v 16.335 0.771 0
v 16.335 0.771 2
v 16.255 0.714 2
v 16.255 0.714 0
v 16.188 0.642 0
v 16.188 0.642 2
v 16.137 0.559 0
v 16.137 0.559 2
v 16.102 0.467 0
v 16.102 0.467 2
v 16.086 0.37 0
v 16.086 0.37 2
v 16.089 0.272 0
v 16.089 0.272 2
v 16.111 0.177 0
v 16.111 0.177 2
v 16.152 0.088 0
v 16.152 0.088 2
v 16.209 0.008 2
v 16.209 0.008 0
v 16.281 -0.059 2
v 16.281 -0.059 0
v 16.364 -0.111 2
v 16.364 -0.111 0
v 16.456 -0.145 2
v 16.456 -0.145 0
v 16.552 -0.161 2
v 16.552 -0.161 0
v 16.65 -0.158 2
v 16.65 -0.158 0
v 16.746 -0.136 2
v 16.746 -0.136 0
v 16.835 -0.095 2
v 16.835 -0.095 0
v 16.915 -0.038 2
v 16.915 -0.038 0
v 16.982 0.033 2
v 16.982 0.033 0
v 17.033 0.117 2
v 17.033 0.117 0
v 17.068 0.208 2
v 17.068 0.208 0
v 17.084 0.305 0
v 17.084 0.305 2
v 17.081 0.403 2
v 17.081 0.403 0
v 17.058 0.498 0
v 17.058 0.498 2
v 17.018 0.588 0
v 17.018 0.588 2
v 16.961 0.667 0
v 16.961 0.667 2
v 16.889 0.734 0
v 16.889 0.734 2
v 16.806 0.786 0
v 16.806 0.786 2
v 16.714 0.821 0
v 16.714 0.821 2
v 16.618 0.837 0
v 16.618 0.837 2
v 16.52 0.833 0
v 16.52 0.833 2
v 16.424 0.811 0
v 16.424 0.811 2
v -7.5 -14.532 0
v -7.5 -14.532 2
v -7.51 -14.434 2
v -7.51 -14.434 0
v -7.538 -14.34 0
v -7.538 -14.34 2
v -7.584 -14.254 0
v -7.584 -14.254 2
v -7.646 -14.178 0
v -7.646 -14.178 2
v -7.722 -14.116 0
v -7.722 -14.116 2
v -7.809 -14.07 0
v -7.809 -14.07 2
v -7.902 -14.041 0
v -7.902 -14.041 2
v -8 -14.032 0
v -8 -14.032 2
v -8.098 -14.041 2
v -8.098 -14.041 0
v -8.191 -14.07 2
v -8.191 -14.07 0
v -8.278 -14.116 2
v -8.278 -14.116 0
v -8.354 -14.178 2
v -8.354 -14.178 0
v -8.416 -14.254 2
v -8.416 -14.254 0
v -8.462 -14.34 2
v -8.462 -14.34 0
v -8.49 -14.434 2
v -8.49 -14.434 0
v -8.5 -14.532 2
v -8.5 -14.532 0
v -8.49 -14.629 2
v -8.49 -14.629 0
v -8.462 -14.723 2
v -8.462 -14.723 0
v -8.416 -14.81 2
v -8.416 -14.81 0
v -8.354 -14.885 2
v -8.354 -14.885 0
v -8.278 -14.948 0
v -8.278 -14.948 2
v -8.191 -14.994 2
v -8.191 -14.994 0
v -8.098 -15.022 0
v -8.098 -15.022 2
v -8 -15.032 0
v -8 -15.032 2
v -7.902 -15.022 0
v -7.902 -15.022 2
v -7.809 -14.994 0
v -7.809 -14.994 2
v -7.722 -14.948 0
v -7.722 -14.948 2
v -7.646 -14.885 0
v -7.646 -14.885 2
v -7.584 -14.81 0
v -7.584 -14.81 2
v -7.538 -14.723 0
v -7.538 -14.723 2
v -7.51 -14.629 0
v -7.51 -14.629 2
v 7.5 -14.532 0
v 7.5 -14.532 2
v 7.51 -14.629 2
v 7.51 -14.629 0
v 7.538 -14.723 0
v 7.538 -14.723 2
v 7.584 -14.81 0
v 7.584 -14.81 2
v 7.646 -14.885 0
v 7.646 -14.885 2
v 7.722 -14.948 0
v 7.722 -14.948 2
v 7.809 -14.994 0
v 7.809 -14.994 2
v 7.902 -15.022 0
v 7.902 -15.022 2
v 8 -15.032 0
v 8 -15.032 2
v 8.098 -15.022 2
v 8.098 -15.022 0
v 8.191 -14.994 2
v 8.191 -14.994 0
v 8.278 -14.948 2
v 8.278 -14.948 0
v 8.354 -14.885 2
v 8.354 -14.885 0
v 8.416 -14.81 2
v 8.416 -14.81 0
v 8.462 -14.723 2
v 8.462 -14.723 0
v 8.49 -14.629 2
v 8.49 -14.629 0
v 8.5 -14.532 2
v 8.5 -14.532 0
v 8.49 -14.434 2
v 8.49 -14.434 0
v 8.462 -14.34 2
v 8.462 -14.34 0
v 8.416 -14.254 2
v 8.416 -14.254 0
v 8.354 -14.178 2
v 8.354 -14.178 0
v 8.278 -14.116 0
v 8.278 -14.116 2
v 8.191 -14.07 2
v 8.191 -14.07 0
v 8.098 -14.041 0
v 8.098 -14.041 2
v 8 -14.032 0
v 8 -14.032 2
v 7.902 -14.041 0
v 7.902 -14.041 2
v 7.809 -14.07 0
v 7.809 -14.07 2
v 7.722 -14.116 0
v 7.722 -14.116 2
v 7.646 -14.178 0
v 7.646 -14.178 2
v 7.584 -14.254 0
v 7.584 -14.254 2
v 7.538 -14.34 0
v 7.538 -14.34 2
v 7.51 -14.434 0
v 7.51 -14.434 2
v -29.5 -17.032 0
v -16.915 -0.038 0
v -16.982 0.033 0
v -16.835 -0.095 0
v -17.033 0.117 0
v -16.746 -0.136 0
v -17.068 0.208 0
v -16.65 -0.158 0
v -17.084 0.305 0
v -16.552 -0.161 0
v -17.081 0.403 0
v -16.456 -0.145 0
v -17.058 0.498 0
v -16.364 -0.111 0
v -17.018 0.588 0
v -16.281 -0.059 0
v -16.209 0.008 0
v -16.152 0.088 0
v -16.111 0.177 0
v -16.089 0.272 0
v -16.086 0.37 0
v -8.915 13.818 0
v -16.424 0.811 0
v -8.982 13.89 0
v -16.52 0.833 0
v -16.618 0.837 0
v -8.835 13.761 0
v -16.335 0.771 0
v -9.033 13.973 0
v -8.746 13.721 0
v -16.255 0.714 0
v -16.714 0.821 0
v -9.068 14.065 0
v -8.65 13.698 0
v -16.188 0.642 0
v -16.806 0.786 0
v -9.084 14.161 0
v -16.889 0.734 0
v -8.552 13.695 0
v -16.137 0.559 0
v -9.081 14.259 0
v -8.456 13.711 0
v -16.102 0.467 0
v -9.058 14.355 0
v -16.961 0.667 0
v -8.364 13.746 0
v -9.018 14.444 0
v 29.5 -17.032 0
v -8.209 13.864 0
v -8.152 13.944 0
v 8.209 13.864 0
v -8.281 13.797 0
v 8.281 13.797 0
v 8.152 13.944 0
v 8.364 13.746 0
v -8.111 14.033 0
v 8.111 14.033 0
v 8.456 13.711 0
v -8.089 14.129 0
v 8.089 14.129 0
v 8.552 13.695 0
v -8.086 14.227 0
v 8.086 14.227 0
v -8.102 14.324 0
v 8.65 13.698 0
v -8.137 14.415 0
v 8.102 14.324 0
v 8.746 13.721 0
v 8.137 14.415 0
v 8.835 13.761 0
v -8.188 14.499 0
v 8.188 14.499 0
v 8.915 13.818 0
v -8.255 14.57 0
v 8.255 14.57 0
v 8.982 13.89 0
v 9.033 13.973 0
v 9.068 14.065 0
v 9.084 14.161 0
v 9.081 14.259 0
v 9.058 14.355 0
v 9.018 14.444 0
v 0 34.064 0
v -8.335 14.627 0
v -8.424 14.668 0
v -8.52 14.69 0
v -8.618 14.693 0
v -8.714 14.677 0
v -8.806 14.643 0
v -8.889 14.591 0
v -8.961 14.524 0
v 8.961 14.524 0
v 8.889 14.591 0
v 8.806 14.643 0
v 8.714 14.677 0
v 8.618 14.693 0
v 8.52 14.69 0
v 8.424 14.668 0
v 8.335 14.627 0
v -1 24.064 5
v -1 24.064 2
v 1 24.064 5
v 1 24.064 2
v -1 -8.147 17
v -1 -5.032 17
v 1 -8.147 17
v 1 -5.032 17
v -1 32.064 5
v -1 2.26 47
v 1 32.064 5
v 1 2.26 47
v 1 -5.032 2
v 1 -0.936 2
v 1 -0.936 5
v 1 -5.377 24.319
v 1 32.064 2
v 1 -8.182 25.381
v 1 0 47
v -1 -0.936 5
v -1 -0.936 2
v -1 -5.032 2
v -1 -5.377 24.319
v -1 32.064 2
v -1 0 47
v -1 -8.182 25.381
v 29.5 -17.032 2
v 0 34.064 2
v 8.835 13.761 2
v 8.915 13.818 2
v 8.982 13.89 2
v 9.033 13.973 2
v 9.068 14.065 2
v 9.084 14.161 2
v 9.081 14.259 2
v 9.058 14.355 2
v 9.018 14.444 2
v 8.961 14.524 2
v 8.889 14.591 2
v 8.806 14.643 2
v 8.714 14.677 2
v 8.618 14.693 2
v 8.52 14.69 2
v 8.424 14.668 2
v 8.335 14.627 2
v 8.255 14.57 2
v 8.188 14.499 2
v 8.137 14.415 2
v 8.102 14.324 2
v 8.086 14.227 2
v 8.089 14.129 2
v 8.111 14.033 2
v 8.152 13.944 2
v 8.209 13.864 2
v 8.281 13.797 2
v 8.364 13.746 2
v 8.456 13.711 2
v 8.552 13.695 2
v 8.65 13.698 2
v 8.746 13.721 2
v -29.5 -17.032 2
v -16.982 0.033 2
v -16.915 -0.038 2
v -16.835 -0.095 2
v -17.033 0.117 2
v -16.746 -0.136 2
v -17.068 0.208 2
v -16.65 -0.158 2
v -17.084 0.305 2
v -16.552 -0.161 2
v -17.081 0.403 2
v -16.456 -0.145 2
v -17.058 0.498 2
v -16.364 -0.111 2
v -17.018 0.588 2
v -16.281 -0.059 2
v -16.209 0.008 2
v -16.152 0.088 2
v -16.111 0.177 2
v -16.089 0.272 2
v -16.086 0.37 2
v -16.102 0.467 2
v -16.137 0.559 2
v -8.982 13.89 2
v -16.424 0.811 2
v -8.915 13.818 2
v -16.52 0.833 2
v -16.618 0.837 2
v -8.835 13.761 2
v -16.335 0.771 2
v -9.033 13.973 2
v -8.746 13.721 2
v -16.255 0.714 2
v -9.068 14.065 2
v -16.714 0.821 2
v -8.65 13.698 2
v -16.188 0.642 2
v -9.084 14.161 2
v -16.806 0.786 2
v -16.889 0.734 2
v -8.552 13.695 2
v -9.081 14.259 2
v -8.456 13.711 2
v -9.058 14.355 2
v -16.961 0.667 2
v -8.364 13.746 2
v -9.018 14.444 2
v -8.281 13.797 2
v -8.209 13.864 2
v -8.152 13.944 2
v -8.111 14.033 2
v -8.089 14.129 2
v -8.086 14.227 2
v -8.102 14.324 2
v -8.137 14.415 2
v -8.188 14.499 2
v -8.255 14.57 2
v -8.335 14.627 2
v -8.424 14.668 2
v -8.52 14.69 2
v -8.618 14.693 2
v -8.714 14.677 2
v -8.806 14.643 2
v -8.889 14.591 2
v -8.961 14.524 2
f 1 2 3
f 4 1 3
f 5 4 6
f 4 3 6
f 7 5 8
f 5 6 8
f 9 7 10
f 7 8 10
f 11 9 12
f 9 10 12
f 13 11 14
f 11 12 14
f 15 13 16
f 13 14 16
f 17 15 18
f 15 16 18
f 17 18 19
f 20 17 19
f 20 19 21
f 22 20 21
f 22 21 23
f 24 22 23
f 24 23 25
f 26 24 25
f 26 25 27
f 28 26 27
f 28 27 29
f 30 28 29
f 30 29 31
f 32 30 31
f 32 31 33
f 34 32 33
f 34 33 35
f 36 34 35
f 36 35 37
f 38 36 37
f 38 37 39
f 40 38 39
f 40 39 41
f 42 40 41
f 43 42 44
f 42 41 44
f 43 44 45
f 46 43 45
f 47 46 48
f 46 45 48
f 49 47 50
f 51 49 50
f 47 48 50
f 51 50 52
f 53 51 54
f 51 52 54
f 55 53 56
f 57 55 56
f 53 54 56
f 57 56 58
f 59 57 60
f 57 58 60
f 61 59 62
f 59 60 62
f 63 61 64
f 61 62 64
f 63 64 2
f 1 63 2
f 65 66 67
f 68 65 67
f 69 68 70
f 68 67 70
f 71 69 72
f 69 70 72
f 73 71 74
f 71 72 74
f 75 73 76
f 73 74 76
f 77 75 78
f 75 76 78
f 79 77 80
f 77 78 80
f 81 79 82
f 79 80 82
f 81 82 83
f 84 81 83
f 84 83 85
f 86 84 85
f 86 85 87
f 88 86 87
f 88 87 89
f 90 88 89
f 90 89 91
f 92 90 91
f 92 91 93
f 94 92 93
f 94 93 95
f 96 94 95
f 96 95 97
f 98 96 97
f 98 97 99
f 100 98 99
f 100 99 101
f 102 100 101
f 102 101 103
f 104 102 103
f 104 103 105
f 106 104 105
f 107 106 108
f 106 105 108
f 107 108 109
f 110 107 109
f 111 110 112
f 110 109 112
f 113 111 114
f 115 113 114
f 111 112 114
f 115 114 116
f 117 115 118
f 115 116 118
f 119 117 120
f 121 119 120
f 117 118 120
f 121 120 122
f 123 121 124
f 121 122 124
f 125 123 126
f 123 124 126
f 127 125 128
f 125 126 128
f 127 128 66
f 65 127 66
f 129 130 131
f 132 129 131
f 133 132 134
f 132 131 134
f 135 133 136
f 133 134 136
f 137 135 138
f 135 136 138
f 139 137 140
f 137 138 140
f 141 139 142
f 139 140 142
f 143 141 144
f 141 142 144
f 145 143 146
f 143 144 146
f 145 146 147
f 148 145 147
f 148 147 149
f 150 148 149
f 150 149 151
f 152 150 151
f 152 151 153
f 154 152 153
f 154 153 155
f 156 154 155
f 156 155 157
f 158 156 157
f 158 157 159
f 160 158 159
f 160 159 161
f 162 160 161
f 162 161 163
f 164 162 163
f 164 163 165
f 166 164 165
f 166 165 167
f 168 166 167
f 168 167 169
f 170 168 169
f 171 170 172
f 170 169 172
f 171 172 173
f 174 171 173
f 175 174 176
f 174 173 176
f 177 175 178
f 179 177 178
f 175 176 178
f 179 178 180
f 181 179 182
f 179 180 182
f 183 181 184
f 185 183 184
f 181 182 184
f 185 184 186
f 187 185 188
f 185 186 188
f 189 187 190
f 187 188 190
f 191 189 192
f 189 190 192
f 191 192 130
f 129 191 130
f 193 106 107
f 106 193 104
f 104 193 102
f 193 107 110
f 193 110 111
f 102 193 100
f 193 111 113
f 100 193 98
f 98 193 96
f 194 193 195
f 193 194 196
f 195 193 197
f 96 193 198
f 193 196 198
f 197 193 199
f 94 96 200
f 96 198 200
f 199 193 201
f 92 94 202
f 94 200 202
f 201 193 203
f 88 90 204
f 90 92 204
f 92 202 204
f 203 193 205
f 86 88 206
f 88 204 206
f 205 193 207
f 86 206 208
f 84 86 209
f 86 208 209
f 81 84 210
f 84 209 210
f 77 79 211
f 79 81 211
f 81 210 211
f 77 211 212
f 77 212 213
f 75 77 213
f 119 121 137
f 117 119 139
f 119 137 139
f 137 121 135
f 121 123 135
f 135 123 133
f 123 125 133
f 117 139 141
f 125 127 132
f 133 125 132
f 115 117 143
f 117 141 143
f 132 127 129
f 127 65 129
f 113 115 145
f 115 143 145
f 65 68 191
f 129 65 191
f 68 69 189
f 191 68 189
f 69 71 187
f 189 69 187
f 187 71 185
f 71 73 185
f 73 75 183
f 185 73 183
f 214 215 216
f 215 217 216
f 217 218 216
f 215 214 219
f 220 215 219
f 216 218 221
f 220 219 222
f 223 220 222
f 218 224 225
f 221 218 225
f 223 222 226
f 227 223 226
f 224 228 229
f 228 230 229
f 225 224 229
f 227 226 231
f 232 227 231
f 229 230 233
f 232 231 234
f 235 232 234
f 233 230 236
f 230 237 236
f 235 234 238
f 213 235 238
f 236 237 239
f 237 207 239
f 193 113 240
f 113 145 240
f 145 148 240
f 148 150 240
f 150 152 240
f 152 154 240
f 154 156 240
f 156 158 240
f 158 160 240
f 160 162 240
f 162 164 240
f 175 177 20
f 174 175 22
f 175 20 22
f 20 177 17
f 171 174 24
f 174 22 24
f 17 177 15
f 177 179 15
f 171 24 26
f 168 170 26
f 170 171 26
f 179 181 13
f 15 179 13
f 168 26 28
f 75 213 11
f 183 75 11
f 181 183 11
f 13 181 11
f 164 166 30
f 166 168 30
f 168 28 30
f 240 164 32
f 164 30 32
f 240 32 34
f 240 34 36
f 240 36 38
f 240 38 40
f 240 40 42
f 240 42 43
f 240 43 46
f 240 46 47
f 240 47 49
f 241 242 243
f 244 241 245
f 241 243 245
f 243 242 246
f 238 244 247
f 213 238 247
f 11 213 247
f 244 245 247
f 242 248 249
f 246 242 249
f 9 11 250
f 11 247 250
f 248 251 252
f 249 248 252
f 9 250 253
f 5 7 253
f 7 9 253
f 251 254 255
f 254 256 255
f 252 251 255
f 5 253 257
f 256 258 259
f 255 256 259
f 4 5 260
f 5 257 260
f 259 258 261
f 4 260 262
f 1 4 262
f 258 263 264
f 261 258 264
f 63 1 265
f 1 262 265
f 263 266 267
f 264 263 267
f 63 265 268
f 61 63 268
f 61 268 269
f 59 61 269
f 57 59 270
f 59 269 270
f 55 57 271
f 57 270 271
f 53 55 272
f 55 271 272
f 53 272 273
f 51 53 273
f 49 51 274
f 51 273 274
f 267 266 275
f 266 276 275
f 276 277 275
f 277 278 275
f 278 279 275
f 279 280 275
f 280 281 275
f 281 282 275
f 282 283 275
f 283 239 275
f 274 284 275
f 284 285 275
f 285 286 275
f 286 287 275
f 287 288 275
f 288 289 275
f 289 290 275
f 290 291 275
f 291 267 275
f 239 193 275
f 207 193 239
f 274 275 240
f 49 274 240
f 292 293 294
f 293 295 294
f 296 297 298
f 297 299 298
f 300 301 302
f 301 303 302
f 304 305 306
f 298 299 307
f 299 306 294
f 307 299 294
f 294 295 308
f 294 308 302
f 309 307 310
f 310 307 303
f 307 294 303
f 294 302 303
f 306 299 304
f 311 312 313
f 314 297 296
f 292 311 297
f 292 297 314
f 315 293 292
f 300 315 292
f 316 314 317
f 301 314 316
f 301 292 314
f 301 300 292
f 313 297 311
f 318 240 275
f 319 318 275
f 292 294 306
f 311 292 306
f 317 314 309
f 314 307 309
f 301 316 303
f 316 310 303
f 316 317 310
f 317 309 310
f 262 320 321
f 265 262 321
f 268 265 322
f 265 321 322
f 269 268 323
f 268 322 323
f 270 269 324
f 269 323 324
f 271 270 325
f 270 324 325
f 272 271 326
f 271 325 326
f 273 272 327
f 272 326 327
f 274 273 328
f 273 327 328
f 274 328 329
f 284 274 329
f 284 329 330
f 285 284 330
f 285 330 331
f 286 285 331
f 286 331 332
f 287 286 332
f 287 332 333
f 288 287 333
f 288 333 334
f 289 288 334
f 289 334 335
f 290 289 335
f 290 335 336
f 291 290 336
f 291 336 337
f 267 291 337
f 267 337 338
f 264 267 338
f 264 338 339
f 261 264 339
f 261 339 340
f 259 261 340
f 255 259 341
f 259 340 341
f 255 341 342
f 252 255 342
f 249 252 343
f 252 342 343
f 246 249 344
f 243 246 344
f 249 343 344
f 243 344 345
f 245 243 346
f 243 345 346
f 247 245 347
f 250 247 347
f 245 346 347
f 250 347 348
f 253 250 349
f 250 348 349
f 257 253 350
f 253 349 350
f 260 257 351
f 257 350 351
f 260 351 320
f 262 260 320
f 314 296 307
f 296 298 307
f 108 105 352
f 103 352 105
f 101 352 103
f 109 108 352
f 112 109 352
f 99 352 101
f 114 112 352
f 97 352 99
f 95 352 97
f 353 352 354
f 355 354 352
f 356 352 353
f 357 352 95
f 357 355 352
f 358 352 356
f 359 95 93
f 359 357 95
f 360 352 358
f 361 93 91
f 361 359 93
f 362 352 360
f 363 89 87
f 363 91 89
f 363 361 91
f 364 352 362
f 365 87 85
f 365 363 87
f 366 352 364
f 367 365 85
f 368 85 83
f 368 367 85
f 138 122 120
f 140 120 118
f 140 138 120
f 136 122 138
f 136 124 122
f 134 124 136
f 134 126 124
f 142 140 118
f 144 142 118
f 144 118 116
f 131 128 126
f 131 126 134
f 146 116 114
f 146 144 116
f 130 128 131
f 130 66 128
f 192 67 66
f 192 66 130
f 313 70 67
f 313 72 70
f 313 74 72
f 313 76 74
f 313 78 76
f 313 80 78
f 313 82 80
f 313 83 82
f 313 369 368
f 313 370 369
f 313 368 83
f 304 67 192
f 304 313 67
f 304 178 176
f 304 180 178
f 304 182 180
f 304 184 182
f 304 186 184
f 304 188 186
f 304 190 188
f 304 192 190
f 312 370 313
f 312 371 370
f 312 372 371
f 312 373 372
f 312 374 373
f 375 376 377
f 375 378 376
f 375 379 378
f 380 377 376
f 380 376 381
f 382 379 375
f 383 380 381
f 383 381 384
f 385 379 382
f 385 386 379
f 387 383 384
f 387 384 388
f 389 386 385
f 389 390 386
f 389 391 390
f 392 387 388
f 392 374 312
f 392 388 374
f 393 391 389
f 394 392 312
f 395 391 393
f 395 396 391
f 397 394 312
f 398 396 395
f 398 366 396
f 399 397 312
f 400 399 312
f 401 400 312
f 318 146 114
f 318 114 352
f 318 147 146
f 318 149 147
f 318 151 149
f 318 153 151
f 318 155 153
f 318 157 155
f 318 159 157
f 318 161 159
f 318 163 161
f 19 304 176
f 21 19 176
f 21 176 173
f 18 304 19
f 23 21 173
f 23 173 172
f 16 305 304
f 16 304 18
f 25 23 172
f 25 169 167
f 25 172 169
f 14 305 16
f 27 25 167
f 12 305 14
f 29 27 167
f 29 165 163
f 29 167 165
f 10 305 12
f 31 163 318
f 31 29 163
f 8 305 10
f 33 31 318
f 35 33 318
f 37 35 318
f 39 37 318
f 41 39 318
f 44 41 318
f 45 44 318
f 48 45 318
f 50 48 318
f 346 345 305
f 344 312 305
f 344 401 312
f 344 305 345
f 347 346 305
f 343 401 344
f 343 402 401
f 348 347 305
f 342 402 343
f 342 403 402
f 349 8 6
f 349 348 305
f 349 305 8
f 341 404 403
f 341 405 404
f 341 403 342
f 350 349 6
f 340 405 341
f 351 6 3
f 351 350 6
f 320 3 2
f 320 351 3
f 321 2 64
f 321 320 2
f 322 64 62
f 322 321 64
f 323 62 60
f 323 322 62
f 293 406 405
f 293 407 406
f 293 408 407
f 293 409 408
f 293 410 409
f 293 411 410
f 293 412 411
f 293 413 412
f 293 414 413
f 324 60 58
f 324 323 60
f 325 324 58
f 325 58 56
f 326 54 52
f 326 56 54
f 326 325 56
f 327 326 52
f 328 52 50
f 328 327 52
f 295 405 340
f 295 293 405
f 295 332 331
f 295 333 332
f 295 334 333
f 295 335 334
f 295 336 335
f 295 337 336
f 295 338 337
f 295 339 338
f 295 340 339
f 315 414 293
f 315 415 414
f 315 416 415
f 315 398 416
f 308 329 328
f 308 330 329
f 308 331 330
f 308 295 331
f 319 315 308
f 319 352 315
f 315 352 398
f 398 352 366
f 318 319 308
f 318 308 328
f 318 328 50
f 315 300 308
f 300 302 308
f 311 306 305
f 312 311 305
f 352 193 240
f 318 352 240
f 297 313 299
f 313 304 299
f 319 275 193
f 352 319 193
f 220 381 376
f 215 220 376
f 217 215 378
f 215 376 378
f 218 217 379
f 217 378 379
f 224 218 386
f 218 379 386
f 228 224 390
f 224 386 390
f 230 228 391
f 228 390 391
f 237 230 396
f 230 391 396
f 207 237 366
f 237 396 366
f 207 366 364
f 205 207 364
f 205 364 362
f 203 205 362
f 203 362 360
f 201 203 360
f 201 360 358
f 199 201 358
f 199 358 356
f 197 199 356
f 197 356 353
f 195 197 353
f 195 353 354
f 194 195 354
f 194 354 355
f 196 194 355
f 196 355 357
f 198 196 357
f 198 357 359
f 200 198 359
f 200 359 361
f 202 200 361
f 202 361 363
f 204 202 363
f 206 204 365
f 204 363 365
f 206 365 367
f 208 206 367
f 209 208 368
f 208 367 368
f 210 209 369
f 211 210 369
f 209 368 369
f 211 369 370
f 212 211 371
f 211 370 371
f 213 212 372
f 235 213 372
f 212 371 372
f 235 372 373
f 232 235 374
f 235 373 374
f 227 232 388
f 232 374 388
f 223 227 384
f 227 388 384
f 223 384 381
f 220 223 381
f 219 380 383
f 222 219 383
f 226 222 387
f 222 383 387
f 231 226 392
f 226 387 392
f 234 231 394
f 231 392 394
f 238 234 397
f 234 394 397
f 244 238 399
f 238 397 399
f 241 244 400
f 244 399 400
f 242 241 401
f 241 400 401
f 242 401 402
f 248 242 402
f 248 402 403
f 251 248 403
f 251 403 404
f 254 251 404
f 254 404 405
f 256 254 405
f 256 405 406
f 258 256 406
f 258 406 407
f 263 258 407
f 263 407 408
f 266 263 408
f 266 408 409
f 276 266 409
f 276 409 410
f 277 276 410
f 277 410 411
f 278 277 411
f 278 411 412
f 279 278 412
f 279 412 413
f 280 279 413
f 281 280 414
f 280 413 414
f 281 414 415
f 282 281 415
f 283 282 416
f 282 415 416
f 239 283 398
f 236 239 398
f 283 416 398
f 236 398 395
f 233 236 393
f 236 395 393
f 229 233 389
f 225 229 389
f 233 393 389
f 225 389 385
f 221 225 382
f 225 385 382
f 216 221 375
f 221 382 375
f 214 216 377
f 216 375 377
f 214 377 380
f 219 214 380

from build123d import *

# Parameters (mm, degrees)
BOSS_EXTRUDE1_DEPTH = 2
BOSS_EXTRUDE2_DEPTH = 1
SKETCH3_R           = 0.5
CUT_EXTRUDE1_DEPTH  = 64.683462008
CIRPATTERN1_COUNT   = 3


with BuildPart() as part:
    # Sketch1 → Boss-Extrude1 (new body)
    with BuildSketch(Plane.XY):
        Polygon((0, 34.063665882), (-29.5, -17.031832941), (29.5, -17.031832941), align=None)
    extrude(amount=BOSS_EXTRUDE1_DEPTH)

    # Sketch2 → Boss-Extrude2 (add, symmetric)
    with BuildSketch(Plane(origin=(0, 0, 0), x_dir=(0, 0, -1), z_dir=(1, 0, 0))):
        Polygon((-2, -0.936334118), (-2, -5.031832941), (-17, -5.031832941), (-17, -8.146867769), (-24.319391415, -5.376586618), (-25.381329824, -8.182346196), (-47, 0), (-47, 2.259927745), (-5, 32.063665882), (-2, 32.063665882), (-2, 24.063665882), (-5, 24.063665882), (-5, -0.936334118), align=None)
    extrude(amount=BOSS_EXTRUDE2_DEPTH, both=True)

    # Sketch3 → Cut-Extrude1 (cut, through all)
    with BuildSketch(Plane.XY.offset(2)):
        with Locations((-8, -14.531832941)):
            Circle(SKETCH3_R)
        with Locations((8, -14.531832941)):
            Circle(SKETCH3_R)
    cut_extrude1 = extrude(amount=-CUT_EXTRUDE1_DEPTH, mode=Mode.SUBTRACT)

    # CirPattern1: Cut-Extrude1 ×3 about axis
    cirpattern1_axis = Axis((0, 0, -2.35), (0, 0, 1))
    for i in range(1, CIRPATTERN1_COUNT):
        add(cut_extrude1.rotate(cirpattern1_axis, i * 360 / CIRPATTERN1_COUNT), mode=Mode.SUBTRACT)


solid = part.part
